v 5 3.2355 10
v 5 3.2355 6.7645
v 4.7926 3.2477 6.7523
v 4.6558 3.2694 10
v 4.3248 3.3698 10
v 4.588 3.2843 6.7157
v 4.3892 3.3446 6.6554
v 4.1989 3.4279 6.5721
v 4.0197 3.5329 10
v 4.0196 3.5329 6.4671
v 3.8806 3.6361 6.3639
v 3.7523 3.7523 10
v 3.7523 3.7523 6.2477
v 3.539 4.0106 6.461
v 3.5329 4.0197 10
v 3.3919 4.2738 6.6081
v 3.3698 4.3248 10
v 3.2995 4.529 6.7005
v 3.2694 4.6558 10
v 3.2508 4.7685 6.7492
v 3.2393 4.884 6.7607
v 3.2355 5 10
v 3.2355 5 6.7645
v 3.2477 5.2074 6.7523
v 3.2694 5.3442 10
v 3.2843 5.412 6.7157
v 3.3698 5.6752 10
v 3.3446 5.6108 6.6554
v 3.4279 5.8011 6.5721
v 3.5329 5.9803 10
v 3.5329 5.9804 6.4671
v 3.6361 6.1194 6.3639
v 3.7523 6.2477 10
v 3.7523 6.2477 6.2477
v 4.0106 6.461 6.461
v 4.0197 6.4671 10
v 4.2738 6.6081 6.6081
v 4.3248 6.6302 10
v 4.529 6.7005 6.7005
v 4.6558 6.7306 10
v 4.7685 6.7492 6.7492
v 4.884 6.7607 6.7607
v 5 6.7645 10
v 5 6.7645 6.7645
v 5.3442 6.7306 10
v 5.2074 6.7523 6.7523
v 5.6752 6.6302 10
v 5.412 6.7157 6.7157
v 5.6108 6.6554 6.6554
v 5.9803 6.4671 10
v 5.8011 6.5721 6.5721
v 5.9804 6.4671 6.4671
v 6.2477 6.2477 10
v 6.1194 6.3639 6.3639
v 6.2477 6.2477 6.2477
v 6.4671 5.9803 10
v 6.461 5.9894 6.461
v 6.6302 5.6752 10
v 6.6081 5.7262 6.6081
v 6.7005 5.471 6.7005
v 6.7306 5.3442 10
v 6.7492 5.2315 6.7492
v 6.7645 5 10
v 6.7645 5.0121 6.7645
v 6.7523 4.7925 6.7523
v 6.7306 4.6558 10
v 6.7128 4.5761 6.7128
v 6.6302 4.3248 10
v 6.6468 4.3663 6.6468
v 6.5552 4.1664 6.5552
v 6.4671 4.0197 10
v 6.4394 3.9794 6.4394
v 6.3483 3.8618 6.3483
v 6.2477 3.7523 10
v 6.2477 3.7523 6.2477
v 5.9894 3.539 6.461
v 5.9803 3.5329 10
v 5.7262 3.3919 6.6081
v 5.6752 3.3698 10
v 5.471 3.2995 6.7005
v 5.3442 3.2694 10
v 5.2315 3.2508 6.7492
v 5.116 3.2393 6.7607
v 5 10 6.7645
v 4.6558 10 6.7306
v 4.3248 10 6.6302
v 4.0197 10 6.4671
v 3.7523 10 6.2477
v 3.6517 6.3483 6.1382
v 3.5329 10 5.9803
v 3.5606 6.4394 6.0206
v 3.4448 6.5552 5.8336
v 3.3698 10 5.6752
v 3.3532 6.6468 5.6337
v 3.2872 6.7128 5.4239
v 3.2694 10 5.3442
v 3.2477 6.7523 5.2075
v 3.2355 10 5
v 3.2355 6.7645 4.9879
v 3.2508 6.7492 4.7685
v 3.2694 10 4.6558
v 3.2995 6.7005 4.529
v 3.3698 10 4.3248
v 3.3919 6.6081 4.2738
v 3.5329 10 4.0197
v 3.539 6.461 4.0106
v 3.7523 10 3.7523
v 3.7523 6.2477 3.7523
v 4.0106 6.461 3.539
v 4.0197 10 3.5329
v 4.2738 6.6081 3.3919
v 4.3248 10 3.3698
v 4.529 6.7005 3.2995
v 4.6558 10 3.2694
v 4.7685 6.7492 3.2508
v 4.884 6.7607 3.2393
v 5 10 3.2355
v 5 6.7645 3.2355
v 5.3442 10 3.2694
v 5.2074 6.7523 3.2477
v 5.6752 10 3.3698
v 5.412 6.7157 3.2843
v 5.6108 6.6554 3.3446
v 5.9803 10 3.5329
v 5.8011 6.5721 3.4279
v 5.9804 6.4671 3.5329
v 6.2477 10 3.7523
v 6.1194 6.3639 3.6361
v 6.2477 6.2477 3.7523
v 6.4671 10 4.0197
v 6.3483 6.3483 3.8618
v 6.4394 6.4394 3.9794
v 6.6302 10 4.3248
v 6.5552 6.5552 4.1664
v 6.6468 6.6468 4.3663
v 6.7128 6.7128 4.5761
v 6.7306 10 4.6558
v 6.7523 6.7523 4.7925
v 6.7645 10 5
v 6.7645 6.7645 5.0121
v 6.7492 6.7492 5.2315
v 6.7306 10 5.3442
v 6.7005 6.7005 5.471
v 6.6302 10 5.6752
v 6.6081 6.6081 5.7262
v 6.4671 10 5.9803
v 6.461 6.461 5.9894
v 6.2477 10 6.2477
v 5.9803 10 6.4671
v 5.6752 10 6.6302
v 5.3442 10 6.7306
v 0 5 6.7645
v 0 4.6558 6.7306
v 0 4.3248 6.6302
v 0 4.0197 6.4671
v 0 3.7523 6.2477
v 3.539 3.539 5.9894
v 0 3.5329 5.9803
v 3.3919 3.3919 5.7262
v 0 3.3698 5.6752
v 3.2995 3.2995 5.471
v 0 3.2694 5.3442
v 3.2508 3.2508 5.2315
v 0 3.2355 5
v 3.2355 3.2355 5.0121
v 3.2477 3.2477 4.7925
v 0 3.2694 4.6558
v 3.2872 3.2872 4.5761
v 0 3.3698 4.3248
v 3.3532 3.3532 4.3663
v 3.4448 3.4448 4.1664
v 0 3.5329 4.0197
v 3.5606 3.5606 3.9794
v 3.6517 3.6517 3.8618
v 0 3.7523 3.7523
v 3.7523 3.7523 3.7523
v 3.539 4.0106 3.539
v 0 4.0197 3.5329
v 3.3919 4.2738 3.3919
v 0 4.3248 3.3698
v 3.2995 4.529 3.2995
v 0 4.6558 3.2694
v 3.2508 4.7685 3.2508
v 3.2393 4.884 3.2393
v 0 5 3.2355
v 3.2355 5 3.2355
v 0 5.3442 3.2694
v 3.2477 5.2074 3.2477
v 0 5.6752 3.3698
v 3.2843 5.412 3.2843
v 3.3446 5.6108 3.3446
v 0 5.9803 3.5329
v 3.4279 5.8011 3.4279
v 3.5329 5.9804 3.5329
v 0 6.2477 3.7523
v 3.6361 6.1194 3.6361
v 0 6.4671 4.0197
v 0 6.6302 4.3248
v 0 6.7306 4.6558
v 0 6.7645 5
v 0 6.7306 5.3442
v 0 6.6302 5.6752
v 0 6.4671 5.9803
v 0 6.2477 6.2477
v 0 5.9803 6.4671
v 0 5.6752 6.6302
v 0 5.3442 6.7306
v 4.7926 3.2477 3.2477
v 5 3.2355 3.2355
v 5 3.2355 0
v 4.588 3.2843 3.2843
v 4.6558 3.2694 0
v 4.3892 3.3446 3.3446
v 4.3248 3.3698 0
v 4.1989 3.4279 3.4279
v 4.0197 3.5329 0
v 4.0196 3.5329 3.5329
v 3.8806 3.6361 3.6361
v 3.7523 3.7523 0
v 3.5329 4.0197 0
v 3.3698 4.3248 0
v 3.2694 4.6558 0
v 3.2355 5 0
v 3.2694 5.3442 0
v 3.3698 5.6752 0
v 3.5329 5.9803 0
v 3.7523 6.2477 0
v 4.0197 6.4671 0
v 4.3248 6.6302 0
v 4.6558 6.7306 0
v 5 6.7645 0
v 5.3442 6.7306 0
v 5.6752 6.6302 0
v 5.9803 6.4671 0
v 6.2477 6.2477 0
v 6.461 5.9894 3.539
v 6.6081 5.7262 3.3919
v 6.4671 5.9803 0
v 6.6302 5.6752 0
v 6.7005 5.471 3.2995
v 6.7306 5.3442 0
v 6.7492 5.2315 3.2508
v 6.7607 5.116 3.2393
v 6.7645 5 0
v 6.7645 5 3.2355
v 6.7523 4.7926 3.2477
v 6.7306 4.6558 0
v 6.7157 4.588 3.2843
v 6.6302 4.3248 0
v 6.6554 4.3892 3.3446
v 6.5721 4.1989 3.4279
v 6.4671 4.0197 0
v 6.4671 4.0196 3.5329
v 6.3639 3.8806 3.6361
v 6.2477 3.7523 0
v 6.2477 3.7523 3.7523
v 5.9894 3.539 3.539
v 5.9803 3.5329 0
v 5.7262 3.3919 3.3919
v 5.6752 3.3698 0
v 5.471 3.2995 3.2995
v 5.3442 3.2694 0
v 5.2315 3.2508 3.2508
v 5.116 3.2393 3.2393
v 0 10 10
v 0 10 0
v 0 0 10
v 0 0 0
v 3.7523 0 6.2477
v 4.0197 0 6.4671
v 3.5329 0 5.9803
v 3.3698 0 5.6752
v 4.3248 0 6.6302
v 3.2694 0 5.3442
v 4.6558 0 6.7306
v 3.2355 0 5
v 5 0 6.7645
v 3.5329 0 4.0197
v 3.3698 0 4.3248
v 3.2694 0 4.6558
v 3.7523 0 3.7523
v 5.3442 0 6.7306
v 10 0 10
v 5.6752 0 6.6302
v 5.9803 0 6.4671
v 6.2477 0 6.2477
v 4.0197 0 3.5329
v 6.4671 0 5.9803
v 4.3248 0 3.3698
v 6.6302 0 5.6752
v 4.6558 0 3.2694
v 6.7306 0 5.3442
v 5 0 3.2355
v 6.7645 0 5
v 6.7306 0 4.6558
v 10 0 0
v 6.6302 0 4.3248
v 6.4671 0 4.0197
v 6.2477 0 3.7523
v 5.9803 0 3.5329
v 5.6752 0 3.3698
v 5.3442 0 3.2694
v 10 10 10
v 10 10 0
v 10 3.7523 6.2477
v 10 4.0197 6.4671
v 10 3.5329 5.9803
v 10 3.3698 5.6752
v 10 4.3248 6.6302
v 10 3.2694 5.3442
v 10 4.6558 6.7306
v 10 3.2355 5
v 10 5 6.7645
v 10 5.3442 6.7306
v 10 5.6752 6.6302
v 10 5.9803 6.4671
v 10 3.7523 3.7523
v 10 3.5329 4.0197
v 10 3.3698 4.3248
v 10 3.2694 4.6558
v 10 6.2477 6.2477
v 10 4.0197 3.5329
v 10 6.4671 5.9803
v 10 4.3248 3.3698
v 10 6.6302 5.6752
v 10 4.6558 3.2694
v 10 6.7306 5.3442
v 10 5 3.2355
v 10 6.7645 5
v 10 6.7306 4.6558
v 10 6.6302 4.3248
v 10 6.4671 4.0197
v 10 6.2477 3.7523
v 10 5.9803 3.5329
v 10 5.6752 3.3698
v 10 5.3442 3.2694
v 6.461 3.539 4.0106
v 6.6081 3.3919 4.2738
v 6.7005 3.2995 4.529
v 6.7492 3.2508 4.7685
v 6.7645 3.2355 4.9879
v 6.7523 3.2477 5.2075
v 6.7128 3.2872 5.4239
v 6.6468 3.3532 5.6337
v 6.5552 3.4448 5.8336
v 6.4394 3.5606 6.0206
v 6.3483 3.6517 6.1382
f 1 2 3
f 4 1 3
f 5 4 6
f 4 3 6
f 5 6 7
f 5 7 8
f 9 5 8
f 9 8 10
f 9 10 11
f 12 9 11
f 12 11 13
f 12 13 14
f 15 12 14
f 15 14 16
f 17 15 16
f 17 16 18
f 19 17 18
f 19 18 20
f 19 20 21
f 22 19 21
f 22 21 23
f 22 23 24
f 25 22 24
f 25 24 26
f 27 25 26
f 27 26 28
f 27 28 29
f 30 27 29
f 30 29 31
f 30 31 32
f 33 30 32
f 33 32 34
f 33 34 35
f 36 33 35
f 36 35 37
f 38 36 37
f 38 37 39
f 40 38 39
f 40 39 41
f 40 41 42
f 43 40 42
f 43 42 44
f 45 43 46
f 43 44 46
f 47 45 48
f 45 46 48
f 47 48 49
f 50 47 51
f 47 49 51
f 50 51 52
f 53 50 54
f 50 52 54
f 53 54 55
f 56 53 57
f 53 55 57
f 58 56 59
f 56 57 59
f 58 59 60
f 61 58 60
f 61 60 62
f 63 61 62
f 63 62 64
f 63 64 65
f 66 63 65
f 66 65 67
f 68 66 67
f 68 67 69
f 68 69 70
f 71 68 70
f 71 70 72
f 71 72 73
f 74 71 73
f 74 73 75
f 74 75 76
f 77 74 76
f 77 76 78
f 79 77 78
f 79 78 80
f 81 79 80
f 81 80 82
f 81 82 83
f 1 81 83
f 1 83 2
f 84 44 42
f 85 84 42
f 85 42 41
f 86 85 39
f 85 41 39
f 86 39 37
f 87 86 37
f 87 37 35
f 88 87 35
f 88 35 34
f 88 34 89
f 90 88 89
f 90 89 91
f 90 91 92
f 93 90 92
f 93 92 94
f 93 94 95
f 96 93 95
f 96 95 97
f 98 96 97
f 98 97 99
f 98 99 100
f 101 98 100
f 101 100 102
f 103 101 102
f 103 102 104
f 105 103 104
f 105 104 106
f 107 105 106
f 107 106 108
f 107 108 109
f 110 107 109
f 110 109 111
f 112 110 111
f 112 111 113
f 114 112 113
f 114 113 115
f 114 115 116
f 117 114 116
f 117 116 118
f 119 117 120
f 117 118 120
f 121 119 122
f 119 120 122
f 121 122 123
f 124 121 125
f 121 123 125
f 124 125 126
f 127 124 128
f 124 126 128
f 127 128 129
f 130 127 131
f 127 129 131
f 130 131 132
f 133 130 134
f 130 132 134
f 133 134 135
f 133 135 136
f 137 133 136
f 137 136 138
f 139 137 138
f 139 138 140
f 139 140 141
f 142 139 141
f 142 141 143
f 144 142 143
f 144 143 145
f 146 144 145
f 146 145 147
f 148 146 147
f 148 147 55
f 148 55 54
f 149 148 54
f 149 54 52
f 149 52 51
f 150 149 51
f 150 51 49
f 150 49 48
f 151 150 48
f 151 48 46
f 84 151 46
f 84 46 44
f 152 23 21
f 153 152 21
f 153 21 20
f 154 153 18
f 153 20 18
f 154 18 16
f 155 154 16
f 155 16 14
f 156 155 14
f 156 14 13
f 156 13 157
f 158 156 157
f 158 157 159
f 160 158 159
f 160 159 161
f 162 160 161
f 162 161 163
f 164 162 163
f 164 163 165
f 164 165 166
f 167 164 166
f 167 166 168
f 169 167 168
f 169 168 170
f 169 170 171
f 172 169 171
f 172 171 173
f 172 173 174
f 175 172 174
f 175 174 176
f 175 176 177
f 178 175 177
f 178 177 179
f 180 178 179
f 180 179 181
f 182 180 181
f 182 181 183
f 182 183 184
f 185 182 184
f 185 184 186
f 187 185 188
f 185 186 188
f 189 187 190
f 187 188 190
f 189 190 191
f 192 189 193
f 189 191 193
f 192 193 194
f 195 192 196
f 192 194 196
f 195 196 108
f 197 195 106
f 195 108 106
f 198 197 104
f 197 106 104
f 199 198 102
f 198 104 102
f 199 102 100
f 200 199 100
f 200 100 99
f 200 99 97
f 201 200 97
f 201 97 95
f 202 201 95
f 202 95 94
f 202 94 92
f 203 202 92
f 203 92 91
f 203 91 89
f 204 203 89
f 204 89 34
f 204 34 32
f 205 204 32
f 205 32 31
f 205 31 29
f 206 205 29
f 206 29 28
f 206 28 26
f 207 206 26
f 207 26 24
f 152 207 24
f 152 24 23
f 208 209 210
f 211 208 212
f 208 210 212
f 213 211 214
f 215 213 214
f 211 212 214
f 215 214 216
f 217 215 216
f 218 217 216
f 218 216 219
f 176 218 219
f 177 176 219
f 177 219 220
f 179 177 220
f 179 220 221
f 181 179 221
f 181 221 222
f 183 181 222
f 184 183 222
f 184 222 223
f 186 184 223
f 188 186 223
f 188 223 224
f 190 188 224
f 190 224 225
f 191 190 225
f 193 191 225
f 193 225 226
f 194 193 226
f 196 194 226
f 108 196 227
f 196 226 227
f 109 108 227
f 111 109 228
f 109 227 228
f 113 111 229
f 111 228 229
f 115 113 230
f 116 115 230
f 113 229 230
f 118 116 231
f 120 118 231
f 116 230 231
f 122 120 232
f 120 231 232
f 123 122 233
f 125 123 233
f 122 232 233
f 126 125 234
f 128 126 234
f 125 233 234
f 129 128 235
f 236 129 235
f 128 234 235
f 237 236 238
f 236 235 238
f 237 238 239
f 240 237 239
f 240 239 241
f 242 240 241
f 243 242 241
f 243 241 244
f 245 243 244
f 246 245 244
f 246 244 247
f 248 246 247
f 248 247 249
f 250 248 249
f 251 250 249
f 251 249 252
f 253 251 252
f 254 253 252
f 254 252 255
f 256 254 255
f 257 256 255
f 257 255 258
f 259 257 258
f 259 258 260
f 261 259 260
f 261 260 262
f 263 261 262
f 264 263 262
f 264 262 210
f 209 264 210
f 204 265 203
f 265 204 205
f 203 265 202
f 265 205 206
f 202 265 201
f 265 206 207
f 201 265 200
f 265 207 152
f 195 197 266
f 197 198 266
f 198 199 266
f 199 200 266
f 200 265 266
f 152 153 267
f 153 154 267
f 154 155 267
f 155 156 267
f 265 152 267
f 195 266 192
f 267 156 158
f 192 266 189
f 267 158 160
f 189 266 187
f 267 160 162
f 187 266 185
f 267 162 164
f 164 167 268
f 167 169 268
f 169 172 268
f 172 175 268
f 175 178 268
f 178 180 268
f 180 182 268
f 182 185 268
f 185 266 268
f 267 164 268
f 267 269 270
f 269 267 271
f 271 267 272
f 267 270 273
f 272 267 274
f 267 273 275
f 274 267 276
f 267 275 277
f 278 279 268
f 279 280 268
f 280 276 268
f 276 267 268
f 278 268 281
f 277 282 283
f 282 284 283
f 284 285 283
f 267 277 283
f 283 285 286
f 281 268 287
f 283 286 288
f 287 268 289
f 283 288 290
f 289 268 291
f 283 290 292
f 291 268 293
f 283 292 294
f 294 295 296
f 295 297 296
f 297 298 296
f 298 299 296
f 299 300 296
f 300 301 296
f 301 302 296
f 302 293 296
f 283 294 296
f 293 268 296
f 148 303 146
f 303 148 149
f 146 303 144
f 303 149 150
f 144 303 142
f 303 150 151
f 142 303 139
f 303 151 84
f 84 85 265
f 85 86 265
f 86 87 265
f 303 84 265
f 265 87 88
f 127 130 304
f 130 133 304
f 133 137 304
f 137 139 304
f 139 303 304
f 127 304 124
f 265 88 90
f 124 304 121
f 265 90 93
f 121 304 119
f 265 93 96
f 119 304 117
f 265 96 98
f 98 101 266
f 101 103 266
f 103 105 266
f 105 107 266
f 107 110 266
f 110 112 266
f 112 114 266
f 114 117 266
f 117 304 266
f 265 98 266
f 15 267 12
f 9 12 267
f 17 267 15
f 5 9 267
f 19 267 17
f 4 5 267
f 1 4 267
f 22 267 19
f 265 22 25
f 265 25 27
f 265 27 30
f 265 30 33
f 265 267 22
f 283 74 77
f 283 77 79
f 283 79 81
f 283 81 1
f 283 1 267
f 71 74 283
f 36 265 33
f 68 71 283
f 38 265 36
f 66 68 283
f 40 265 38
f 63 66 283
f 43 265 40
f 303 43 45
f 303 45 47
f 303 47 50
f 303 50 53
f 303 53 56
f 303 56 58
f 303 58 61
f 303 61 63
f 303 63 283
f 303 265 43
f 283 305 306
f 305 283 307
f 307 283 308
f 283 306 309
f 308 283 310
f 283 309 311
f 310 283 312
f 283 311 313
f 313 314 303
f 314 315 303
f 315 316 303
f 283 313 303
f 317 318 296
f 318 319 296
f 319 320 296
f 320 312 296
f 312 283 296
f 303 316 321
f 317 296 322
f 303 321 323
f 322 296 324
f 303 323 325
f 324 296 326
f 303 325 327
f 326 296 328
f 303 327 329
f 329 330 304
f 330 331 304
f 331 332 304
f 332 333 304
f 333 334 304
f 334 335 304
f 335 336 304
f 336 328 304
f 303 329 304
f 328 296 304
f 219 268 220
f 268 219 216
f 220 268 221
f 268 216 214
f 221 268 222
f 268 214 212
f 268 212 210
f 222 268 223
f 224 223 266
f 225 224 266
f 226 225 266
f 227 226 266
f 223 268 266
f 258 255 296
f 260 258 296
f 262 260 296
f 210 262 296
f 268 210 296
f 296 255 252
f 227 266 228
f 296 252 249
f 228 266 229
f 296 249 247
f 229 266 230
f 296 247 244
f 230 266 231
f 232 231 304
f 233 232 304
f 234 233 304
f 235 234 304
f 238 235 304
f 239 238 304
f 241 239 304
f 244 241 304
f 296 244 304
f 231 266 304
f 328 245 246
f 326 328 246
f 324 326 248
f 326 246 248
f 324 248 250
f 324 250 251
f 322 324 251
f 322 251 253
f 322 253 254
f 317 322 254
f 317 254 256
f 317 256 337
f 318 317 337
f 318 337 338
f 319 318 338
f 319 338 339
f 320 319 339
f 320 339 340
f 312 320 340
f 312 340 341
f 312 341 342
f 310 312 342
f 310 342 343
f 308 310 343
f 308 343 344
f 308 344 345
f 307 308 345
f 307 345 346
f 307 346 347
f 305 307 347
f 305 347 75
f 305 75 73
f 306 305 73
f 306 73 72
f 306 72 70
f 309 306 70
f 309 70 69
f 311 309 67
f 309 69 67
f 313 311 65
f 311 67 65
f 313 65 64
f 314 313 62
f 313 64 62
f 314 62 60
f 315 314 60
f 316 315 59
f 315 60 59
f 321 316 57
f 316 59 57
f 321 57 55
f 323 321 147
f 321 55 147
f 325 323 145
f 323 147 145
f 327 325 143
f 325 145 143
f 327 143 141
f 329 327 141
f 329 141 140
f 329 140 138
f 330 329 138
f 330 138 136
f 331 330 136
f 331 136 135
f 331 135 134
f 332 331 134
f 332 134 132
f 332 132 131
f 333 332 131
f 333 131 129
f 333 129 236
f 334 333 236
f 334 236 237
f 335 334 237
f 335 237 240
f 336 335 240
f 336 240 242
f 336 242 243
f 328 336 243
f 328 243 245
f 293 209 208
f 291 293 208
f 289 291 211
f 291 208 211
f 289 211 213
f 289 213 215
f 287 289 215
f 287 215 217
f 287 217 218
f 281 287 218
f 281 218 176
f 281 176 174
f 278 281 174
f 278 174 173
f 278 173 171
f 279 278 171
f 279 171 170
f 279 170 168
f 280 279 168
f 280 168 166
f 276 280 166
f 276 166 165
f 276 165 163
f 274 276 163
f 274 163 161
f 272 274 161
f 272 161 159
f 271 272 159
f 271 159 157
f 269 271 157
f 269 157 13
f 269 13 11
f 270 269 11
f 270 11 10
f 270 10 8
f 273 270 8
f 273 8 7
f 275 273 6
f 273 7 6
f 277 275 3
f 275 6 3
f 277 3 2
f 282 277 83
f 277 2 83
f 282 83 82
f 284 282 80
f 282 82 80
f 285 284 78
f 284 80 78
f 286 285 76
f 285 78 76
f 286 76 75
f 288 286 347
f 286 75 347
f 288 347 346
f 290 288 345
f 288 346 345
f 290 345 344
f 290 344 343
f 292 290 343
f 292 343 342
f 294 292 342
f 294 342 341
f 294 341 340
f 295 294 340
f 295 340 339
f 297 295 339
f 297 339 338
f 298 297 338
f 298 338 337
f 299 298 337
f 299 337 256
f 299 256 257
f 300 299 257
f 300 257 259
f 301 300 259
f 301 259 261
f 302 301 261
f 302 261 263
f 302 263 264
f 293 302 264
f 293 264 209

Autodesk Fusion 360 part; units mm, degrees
sketch "草图1" plane through (0, 0, 0) normal (0, 0, 1) x (1, 0, 0)
  line L0 (0, 0) -> (10, 0)
  line L1 (10, 0) -> (10, 10)
  line L2 (10, 10) -> (0, 10)
  line L3 (0, 10) -> (0, 0)
extrude "拉伸1" add sketch "草图1" along normal blind 10
hole "孔1" at (5, 5, 10) direction (0, 0, -1) diameter 3.529 depth 10 tip angle 180
hole "孔2" at (0, 5, 5) direction (1, 0, 0) diameter 3.529 depth 5 tip angle 180
hole "孔3" at (10, 5, 5) direction (-1, 0, 0) diameter 3.529 depth 5 tip angle 180
hole "孔4" at (5, 10, 5) direction (0, -1, 0) diameter 3.529 depth 5 tip angle 180
hole "孔5" at (5, 0, 5) direction (0, 1, 0) diameter 3.529 depth 5 tip angle 180
